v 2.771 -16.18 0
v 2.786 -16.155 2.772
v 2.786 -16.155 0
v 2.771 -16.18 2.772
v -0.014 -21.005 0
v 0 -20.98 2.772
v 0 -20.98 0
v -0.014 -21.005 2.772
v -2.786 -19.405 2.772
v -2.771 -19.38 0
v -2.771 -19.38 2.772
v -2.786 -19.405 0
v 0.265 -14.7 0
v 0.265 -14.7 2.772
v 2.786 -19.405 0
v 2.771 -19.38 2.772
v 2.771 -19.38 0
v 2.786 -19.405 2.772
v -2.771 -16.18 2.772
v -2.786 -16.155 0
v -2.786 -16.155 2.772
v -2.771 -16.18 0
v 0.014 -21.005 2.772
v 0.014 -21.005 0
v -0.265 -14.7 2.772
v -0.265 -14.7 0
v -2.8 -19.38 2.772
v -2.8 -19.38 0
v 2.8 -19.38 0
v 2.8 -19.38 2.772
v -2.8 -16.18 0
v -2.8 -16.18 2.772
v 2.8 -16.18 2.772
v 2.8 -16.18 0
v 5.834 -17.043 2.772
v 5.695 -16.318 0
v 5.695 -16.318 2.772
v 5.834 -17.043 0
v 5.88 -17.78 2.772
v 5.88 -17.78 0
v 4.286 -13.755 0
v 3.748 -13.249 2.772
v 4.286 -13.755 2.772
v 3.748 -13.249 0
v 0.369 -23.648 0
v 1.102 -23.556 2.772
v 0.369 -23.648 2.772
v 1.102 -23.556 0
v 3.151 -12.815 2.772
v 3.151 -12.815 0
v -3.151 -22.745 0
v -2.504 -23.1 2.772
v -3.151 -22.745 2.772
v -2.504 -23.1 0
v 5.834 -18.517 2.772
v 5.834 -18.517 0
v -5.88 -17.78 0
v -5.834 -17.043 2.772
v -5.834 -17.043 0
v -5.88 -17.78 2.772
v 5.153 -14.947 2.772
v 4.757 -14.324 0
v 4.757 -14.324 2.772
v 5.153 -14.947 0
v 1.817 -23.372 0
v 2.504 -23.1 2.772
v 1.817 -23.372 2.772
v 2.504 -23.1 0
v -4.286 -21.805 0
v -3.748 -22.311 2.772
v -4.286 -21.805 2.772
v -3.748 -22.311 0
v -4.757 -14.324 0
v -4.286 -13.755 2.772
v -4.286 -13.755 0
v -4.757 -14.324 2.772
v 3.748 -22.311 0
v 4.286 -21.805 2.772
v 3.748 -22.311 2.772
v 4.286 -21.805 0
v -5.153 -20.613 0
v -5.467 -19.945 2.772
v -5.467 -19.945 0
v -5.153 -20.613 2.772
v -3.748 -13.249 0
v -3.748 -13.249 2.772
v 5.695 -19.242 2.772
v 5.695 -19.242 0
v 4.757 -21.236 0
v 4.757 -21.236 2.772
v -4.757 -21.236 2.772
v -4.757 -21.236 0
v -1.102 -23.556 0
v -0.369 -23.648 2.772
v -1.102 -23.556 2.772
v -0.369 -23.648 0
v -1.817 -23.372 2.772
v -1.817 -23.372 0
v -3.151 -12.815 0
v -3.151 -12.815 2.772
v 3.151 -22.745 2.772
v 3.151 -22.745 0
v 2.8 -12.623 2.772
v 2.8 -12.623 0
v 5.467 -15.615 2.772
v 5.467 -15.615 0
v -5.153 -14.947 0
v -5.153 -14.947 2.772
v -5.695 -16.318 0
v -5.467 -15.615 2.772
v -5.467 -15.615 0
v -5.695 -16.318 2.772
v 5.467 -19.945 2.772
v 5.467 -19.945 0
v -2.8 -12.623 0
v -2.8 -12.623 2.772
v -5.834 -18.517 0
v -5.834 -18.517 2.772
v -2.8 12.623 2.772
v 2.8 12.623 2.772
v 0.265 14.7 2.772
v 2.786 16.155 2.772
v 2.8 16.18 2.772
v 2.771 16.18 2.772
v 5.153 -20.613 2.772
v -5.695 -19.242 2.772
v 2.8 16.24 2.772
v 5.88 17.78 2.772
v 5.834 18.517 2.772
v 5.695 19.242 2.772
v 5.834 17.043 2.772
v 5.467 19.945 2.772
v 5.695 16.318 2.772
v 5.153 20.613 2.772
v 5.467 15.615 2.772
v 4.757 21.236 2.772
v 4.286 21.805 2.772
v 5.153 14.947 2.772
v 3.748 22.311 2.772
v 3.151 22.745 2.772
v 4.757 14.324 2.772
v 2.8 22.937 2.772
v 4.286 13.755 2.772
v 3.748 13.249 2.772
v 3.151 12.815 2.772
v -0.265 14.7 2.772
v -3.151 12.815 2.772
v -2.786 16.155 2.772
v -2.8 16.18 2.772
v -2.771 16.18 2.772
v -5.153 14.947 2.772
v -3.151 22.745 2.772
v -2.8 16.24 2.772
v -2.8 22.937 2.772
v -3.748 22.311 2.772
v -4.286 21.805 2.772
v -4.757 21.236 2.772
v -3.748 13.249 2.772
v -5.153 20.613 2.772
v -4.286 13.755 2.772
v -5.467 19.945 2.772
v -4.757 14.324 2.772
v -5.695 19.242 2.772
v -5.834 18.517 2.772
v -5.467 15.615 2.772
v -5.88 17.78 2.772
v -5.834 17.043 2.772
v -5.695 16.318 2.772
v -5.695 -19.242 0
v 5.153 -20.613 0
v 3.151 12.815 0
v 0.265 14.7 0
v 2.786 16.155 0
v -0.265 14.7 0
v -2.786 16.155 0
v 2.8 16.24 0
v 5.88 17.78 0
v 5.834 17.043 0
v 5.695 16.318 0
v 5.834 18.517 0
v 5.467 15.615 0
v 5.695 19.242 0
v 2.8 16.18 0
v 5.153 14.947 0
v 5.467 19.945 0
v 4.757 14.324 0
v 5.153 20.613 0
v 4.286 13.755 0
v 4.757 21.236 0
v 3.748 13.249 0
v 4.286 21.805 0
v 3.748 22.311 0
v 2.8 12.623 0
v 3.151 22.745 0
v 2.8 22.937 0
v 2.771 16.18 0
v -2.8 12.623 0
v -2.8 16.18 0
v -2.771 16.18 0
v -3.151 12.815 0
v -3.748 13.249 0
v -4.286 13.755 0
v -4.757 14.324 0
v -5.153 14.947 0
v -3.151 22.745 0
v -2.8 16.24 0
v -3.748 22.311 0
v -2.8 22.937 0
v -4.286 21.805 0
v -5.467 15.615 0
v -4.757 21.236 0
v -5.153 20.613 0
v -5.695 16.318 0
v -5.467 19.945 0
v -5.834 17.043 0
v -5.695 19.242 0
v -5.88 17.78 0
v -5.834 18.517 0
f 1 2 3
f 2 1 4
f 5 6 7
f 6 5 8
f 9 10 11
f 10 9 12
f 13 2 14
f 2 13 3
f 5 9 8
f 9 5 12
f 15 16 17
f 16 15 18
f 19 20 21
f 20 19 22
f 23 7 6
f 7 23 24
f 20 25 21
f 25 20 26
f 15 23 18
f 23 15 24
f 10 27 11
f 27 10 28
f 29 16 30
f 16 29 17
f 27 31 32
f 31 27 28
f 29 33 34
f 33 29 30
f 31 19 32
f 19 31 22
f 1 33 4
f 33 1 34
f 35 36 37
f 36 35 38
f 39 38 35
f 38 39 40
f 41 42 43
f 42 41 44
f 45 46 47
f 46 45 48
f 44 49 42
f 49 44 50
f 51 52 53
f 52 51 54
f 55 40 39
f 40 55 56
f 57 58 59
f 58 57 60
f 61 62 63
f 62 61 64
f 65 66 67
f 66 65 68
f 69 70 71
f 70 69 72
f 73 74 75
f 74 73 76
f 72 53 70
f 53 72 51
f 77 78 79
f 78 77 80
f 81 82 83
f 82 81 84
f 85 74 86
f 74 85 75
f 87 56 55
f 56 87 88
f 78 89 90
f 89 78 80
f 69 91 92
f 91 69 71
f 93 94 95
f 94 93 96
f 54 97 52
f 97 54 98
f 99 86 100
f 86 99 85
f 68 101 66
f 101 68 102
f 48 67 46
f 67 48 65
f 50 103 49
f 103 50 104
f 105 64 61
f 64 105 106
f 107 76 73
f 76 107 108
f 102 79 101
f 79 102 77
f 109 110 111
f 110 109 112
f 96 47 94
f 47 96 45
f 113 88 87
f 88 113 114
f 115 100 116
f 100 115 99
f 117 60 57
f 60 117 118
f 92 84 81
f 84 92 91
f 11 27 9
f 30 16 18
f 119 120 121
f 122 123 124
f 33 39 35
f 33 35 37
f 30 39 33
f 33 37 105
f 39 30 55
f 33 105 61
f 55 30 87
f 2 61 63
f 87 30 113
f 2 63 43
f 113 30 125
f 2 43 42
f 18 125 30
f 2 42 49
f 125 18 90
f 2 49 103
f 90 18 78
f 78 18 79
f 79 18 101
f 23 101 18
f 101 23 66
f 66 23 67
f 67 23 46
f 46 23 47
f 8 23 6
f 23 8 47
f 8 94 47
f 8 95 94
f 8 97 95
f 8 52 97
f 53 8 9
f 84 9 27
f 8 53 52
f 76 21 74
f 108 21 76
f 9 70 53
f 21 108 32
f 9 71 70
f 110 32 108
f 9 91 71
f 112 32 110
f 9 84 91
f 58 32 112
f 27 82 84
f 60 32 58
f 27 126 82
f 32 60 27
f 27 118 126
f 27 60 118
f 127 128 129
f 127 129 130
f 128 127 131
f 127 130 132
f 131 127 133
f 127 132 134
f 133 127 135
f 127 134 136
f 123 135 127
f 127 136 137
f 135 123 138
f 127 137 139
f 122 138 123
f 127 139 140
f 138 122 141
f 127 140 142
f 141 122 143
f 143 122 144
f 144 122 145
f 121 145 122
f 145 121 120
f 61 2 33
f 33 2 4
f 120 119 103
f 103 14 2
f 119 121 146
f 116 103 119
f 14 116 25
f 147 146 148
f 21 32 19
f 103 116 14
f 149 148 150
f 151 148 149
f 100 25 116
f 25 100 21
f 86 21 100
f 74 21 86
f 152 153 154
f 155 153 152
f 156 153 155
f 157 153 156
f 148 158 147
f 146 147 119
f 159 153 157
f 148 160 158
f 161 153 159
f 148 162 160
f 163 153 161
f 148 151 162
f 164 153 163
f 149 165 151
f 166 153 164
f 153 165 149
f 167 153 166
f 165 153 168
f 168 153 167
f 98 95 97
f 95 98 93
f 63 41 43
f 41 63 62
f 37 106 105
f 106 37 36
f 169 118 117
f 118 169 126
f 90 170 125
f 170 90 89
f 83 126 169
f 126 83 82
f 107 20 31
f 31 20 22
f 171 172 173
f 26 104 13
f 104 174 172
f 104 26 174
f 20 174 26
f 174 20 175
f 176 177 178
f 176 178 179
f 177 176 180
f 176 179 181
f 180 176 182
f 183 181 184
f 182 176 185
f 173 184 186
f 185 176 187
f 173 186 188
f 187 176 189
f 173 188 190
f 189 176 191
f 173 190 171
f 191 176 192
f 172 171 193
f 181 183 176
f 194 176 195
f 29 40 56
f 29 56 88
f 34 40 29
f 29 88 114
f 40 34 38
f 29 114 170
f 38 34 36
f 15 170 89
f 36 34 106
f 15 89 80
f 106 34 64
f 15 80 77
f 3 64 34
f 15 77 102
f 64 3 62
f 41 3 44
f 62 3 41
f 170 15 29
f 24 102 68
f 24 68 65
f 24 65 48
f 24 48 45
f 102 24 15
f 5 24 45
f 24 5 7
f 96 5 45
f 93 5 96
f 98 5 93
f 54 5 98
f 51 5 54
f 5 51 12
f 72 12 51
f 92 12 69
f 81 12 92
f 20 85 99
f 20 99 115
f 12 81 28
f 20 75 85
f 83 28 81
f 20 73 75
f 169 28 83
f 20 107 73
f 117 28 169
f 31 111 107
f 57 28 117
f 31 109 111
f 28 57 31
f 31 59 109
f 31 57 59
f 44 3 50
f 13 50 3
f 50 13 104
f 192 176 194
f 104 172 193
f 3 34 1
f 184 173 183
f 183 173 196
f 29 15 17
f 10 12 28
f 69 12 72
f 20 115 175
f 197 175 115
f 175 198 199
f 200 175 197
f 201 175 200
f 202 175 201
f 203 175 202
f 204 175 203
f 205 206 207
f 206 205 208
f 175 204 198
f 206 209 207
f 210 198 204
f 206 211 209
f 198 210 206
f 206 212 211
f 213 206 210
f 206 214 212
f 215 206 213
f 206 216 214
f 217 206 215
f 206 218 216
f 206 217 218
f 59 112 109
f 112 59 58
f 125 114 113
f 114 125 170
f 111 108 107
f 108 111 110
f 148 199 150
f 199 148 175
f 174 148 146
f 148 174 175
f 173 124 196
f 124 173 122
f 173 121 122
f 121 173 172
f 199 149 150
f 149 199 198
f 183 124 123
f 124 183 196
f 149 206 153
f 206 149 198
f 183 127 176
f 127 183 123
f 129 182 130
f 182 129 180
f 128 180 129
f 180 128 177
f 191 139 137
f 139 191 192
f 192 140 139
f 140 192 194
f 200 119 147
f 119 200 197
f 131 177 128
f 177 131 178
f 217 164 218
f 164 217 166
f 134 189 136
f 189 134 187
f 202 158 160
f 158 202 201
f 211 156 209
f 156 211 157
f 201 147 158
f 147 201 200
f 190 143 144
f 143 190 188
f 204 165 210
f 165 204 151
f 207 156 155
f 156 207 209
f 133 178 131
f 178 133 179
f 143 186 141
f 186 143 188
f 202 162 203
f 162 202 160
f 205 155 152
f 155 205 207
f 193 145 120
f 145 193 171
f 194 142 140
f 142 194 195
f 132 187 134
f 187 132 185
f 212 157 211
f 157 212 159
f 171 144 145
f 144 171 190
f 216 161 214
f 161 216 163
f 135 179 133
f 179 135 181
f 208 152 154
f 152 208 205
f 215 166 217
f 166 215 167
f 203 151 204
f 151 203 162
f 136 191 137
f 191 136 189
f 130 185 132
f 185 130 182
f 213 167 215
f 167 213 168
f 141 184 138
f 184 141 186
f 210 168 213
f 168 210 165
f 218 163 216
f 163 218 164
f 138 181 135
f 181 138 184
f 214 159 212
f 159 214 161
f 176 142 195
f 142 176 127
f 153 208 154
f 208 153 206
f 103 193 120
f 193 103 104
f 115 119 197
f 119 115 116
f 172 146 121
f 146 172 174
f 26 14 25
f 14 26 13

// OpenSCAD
use <MCAD/shapes.scad>		// For octagon

$fn = 50;					// So the cylinders are smooth

nut_diameter = 5.6;			// My M3 nut measured ~5.4, I added a fudge factor
nut_thickness = 2.31;

// Calculate some nice values

wrench_thickness = 1.2 * nut_thickness;
wrench_length = 5.25 * nut_diameter;
wrench_head_extra_d = 1.1 * nut_diameter;	// If your wrench is big, you
										// probably just want this to be 10

// Something to make wrench heads for us

module wrench_head(thickness, nut_d, head_extra, open_ended) {
	difference() {
		translate([0, 0, -thickness / 2]) {
			cylinder(h = thickness, r = (nut_d + head_extra) / 2);
		}

		rotate(30) {
			hexagon(nut_d, thickness * 1.1);
		}

		translate([0, nut_d / 2, 0]) {
			if (open_ended) {
				box(nut_d, nut_d + head_extra / 2, thickness * 1.1);
			}
		}
	}
}

// Put us flat on the bed

translate([0, 0, wrench_thickness / 2]) {

	// The handle

	box(nut_diameter, wrench_length, wrench_thickness);

	// Make the closed head

	translate([0, -((wrench_length + wrench_head_extra_d) / 2), 0]) {
		wrench_head(wrench_thickness, nut_diameter, wrench_head_extra_d, false);
	}

	// And the open head

	translate([0, (wrench_length + wrench_head_extra_d) / 2, 0]) {
		wrench_head(wrench_thickness, nut_diameter, wrench_head_extra_d, true);
	}
}
